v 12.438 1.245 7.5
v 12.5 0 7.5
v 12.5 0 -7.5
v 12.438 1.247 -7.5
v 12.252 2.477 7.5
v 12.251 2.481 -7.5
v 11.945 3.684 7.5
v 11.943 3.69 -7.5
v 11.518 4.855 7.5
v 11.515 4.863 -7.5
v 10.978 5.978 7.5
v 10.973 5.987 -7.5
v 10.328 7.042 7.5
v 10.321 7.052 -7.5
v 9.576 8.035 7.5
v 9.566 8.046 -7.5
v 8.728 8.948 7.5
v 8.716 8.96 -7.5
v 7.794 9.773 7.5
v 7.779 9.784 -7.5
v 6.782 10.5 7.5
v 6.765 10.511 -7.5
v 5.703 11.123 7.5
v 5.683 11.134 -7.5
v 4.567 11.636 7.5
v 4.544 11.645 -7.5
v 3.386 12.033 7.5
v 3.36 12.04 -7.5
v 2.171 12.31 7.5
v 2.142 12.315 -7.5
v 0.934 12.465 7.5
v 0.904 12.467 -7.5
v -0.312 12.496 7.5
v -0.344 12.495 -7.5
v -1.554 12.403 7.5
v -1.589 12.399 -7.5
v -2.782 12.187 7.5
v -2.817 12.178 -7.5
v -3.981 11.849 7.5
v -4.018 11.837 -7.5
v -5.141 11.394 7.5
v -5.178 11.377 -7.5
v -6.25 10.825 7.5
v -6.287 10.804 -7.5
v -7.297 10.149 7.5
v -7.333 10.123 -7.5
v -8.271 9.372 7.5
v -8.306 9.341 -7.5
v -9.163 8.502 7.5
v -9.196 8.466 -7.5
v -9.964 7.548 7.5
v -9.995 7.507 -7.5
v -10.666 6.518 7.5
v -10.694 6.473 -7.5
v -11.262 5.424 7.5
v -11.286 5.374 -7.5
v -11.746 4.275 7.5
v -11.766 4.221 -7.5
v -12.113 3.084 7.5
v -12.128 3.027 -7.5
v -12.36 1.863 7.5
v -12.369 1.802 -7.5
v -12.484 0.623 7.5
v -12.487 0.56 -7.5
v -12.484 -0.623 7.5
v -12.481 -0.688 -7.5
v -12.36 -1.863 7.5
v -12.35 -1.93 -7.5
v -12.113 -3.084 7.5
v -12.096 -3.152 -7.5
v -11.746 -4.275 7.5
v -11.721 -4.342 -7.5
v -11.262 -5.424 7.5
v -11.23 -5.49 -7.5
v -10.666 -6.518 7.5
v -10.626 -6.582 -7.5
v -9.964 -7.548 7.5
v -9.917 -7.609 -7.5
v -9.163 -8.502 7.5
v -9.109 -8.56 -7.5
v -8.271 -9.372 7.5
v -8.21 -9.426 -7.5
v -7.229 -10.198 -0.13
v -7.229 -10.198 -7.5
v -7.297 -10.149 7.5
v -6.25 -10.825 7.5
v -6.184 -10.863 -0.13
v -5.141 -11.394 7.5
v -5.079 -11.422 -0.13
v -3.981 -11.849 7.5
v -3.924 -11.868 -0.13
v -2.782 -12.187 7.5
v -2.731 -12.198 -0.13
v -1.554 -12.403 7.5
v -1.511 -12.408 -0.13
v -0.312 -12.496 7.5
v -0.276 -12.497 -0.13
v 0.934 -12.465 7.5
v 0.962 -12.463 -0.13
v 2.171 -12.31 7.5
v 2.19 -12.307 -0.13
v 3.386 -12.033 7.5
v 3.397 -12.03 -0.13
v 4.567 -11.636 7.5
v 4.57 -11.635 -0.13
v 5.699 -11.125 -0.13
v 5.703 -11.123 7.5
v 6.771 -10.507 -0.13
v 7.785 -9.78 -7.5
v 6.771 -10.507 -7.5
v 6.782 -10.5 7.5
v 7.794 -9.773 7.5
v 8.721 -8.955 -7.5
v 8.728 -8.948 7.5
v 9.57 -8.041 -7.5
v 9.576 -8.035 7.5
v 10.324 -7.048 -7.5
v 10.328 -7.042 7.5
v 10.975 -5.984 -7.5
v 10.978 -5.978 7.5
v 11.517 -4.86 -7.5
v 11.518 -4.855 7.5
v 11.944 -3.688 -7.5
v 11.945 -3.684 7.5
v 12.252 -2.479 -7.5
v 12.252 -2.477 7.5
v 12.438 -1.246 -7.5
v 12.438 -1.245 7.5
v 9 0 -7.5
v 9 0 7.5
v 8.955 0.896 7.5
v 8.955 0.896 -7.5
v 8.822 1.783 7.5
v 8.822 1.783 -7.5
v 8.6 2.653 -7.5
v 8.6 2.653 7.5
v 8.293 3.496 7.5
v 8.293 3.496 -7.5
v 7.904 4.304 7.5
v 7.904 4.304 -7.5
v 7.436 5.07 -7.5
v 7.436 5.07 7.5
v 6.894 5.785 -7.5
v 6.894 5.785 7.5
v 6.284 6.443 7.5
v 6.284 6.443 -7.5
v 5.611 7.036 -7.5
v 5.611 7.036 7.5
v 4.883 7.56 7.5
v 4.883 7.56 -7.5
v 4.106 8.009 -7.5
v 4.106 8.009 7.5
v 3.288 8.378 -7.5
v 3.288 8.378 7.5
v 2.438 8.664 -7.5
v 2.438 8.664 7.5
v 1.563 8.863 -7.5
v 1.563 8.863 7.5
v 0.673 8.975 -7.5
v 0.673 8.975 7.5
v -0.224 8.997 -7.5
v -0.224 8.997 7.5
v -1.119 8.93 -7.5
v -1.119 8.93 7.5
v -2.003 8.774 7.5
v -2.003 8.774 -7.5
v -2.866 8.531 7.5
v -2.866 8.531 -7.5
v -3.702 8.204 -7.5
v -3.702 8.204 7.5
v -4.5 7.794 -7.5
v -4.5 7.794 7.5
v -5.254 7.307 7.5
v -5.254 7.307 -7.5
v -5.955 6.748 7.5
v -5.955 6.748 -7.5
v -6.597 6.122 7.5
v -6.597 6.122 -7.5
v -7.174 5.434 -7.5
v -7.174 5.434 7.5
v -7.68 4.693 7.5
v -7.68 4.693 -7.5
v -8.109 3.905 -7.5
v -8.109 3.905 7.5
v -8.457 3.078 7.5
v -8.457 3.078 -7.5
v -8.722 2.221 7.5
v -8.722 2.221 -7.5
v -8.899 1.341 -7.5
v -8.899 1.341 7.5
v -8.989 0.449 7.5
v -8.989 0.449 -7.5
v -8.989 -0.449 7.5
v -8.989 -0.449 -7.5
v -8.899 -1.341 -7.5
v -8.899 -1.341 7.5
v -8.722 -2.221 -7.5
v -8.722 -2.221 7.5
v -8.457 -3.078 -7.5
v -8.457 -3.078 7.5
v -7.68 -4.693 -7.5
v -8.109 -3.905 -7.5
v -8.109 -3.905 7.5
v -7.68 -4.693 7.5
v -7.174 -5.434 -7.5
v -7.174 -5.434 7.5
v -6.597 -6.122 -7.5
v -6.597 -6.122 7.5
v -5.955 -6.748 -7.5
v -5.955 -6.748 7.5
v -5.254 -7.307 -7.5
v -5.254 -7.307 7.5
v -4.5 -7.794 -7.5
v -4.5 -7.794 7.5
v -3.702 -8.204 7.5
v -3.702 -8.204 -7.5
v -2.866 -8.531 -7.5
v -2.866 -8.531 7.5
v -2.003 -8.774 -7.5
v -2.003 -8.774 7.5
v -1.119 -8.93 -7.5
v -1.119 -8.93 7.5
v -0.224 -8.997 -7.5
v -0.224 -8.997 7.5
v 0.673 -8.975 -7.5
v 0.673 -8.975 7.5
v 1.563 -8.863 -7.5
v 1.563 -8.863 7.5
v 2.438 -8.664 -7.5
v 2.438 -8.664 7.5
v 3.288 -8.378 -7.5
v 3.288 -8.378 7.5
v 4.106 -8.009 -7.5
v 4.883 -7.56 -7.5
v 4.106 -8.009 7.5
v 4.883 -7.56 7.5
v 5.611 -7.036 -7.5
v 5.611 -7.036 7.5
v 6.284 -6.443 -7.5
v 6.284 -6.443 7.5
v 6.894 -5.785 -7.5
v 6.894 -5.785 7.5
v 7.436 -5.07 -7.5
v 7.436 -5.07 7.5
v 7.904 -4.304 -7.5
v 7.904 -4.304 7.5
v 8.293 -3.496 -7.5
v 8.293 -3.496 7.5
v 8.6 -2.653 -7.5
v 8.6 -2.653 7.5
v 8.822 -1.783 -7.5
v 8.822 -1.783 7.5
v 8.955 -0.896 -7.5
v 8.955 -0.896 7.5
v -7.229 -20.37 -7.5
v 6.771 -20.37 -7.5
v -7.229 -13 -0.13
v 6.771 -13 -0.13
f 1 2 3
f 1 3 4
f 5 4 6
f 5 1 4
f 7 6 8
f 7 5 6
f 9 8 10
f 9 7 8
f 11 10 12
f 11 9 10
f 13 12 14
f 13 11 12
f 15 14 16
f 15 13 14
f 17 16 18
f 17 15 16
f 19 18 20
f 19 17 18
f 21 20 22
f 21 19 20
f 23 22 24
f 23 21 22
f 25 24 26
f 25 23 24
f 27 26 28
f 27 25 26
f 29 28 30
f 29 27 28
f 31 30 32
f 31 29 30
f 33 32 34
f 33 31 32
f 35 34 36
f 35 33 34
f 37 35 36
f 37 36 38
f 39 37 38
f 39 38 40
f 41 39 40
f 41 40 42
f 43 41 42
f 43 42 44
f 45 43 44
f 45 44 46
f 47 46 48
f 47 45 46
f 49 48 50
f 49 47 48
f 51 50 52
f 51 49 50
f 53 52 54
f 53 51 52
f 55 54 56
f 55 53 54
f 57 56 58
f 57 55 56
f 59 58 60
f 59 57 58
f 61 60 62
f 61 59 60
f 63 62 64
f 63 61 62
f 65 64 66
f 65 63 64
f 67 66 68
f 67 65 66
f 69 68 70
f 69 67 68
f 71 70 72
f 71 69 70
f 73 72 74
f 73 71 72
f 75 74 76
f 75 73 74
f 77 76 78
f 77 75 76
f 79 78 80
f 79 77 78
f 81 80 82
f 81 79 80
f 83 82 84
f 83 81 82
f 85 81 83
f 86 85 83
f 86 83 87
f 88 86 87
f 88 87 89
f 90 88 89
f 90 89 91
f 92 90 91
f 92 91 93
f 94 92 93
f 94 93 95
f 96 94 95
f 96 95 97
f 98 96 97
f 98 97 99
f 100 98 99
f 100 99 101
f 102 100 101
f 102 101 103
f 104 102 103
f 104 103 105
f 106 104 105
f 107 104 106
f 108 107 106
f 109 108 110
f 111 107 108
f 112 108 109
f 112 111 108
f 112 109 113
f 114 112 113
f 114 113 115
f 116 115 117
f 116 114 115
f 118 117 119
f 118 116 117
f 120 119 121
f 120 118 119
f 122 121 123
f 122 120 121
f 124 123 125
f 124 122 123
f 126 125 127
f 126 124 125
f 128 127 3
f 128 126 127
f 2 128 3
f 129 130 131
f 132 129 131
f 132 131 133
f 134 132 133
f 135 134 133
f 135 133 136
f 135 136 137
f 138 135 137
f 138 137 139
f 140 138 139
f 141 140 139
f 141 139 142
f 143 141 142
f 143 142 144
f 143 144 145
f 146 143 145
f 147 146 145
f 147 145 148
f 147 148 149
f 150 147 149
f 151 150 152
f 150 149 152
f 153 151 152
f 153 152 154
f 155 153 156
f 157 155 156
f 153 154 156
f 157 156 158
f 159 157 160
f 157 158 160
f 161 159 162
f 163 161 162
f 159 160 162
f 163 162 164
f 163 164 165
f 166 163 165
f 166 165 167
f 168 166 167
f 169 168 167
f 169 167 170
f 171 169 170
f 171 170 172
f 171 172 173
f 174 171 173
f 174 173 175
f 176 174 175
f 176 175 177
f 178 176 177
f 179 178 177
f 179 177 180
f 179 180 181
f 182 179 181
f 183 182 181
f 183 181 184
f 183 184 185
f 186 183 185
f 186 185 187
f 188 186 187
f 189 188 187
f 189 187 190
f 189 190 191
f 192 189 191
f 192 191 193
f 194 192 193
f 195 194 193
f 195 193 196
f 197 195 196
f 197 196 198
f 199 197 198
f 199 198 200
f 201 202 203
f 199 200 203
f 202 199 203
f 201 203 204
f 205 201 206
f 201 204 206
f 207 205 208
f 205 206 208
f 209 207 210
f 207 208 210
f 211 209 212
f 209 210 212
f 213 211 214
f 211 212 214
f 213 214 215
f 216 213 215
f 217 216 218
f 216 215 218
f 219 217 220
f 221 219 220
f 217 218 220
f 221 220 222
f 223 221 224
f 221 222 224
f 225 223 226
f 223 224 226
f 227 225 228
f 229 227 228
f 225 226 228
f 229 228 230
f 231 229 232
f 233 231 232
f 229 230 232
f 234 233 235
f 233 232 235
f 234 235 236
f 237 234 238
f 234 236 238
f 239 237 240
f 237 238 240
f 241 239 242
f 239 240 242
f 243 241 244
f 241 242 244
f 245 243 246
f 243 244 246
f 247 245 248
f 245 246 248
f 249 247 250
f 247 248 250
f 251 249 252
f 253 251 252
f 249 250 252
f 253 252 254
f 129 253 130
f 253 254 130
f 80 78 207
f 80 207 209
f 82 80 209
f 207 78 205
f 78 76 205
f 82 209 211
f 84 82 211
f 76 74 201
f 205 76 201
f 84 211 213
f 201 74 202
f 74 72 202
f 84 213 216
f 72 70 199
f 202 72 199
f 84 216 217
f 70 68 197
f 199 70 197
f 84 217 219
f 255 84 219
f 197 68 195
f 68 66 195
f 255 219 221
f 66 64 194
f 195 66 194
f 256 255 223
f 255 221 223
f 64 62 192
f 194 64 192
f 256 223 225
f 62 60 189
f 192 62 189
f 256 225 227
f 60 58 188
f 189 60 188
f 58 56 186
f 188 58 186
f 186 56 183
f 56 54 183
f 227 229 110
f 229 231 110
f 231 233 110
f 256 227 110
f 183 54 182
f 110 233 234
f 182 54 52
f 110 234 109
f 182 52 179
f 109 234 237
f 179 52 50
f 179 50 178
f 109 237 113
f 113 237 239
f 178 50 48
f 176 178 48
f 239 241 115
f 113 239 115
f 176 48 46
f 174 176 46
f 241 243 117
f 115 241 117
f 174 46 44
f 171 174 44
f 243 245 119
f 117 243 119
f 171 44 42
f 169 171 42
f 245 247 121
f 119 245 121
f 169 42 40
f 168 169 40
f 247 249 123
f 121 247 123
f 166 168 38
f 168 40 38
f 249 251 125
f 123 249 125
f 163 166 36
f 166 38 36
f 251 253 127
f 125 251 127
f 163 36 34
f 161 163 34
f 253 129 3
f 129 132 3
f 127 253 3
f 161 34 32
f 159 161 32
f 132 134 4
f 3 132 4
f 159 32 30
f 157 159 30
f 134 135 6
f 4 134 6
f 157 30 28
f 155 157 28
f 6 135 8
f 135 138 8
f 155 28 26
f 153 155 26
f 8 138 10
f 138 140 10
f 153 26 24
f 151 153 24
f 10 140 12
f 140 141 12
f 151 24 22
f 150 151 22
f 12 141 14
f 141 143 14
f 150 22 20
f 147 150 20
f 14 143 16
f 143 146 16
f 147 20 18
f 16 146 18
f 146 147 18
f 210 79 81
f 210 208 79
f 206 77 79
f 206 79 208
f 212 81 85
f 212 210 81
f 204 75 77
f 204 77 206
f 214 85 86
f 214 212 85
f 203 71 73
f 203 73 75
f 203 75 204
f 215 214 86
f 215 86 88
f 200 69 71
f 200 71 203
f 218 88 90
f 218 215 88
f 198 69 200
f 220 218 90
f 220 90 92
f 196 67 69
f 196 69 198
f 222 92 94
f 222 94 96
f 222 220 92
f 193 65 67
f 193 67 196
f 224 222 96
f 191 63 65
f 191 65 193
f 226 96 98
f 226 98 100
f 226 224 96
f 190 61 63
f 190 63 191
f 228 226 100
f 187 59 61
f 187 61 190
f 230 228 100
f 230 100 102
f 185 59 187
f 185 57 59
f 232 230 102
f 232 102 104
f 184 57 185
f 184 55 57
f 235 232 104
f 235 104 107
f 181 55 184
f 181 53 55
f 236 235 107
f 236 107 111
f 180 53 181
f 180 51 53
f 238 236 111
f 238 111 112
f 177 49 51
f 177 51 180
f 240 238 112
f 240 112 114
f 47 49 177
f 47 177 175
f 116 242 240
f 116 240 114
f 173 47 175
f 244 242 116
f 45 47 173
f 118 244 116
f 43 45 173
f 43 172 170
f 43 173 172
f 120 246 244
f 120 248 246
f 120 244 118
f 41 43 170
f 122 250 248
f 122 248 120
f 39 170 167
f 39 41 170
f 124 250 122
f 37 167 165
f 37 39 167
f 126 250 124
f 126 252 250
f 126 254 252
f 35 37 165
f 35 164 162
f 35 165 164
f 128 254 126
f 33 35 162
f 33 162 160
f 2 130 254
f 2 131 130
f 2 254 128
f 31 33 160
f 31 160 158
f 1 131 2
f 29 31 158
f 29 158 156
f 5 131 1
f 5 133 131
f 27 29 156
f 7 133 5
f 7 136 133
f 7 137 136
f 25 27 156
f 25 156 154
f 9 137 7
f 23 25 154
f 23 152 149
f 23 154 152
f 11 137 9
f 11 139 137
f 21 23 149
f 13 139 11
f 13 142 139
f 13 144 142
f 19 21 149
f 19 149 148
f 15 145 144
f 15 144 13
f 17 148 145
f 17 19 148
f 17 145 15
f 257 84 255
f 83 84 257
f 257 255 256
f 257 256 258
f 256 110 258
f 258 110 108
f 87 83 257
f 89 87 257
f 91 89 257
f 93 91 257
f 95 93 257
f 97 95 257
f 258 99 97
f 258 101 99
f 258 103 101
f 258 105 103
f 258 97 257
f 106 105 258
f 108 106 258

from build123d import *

# Parameters (mm, degrees)
F0_R        = 12.5
F1_DEPTH    = 7.5
F2_R        = 9
F3_DEPTH    = 25
F4_W        = 14
F4_H        = 7.3697703017
F5_DEPTH    = 23
F6_R        = 9
F7_DEPTH    = 25
F8_T1_DEPTH = 65.4336597593


# Not quite as in the source:
# - a fillet or chamfer that OpenCascade refuses, or shapes differently, is made with other operations: its cross-section is extruded or revolved along the edge and cut away or added


with BuildPart() as f1:
    # F0 (on Top) → F1 (new body, symmetric)
    with BuildSketch(Plane.XY):
        Circle(F0_R)
    extrude(amount=F1_DEPTH, both=True)

    # F2 (on face) → F3 (cut)
    with BuildSketch(Plane.XY.offset(7.5)):
        Circle(F2_R)
    extrude(amount=-F3_DEPTH, mode=Mode.SUBTRACT)

    # F4 (on Front) → F5 (join)
    with BuildSketch(Plane.XZ):
        with Locations((-0.2285402901, -3.8151148492)):
            Rectangle(F4_W, F4_H)
    extrude(amount=F5_DEPTH)

    # F6 (on face) → F7 (cut)
    with BuildSketch(Plane(origin=(0, 0, -7.5), x_dir=(1, 0, 0), z_dir=(0, 0, -1))):
        Circle(F6_R)
    extrude(amount=-F7_DEPTH, mode=Mode.SUBTRACT)

    # F8: chamfer of 10 on 1 edges, made by hand

    # F8_s2 → F8_t1 (cut)
    with BuildSketch(Plane.YZ.offset(-32.9453701698)):
        Polygon((-23, -10.1302296983), (-13, -0.1302296983), (-23, -0.1302296983), align=None)
    extrude(amount=F8_T1_DEPTH, mode=Mode.SUBTRACT)


solid = f1.part
